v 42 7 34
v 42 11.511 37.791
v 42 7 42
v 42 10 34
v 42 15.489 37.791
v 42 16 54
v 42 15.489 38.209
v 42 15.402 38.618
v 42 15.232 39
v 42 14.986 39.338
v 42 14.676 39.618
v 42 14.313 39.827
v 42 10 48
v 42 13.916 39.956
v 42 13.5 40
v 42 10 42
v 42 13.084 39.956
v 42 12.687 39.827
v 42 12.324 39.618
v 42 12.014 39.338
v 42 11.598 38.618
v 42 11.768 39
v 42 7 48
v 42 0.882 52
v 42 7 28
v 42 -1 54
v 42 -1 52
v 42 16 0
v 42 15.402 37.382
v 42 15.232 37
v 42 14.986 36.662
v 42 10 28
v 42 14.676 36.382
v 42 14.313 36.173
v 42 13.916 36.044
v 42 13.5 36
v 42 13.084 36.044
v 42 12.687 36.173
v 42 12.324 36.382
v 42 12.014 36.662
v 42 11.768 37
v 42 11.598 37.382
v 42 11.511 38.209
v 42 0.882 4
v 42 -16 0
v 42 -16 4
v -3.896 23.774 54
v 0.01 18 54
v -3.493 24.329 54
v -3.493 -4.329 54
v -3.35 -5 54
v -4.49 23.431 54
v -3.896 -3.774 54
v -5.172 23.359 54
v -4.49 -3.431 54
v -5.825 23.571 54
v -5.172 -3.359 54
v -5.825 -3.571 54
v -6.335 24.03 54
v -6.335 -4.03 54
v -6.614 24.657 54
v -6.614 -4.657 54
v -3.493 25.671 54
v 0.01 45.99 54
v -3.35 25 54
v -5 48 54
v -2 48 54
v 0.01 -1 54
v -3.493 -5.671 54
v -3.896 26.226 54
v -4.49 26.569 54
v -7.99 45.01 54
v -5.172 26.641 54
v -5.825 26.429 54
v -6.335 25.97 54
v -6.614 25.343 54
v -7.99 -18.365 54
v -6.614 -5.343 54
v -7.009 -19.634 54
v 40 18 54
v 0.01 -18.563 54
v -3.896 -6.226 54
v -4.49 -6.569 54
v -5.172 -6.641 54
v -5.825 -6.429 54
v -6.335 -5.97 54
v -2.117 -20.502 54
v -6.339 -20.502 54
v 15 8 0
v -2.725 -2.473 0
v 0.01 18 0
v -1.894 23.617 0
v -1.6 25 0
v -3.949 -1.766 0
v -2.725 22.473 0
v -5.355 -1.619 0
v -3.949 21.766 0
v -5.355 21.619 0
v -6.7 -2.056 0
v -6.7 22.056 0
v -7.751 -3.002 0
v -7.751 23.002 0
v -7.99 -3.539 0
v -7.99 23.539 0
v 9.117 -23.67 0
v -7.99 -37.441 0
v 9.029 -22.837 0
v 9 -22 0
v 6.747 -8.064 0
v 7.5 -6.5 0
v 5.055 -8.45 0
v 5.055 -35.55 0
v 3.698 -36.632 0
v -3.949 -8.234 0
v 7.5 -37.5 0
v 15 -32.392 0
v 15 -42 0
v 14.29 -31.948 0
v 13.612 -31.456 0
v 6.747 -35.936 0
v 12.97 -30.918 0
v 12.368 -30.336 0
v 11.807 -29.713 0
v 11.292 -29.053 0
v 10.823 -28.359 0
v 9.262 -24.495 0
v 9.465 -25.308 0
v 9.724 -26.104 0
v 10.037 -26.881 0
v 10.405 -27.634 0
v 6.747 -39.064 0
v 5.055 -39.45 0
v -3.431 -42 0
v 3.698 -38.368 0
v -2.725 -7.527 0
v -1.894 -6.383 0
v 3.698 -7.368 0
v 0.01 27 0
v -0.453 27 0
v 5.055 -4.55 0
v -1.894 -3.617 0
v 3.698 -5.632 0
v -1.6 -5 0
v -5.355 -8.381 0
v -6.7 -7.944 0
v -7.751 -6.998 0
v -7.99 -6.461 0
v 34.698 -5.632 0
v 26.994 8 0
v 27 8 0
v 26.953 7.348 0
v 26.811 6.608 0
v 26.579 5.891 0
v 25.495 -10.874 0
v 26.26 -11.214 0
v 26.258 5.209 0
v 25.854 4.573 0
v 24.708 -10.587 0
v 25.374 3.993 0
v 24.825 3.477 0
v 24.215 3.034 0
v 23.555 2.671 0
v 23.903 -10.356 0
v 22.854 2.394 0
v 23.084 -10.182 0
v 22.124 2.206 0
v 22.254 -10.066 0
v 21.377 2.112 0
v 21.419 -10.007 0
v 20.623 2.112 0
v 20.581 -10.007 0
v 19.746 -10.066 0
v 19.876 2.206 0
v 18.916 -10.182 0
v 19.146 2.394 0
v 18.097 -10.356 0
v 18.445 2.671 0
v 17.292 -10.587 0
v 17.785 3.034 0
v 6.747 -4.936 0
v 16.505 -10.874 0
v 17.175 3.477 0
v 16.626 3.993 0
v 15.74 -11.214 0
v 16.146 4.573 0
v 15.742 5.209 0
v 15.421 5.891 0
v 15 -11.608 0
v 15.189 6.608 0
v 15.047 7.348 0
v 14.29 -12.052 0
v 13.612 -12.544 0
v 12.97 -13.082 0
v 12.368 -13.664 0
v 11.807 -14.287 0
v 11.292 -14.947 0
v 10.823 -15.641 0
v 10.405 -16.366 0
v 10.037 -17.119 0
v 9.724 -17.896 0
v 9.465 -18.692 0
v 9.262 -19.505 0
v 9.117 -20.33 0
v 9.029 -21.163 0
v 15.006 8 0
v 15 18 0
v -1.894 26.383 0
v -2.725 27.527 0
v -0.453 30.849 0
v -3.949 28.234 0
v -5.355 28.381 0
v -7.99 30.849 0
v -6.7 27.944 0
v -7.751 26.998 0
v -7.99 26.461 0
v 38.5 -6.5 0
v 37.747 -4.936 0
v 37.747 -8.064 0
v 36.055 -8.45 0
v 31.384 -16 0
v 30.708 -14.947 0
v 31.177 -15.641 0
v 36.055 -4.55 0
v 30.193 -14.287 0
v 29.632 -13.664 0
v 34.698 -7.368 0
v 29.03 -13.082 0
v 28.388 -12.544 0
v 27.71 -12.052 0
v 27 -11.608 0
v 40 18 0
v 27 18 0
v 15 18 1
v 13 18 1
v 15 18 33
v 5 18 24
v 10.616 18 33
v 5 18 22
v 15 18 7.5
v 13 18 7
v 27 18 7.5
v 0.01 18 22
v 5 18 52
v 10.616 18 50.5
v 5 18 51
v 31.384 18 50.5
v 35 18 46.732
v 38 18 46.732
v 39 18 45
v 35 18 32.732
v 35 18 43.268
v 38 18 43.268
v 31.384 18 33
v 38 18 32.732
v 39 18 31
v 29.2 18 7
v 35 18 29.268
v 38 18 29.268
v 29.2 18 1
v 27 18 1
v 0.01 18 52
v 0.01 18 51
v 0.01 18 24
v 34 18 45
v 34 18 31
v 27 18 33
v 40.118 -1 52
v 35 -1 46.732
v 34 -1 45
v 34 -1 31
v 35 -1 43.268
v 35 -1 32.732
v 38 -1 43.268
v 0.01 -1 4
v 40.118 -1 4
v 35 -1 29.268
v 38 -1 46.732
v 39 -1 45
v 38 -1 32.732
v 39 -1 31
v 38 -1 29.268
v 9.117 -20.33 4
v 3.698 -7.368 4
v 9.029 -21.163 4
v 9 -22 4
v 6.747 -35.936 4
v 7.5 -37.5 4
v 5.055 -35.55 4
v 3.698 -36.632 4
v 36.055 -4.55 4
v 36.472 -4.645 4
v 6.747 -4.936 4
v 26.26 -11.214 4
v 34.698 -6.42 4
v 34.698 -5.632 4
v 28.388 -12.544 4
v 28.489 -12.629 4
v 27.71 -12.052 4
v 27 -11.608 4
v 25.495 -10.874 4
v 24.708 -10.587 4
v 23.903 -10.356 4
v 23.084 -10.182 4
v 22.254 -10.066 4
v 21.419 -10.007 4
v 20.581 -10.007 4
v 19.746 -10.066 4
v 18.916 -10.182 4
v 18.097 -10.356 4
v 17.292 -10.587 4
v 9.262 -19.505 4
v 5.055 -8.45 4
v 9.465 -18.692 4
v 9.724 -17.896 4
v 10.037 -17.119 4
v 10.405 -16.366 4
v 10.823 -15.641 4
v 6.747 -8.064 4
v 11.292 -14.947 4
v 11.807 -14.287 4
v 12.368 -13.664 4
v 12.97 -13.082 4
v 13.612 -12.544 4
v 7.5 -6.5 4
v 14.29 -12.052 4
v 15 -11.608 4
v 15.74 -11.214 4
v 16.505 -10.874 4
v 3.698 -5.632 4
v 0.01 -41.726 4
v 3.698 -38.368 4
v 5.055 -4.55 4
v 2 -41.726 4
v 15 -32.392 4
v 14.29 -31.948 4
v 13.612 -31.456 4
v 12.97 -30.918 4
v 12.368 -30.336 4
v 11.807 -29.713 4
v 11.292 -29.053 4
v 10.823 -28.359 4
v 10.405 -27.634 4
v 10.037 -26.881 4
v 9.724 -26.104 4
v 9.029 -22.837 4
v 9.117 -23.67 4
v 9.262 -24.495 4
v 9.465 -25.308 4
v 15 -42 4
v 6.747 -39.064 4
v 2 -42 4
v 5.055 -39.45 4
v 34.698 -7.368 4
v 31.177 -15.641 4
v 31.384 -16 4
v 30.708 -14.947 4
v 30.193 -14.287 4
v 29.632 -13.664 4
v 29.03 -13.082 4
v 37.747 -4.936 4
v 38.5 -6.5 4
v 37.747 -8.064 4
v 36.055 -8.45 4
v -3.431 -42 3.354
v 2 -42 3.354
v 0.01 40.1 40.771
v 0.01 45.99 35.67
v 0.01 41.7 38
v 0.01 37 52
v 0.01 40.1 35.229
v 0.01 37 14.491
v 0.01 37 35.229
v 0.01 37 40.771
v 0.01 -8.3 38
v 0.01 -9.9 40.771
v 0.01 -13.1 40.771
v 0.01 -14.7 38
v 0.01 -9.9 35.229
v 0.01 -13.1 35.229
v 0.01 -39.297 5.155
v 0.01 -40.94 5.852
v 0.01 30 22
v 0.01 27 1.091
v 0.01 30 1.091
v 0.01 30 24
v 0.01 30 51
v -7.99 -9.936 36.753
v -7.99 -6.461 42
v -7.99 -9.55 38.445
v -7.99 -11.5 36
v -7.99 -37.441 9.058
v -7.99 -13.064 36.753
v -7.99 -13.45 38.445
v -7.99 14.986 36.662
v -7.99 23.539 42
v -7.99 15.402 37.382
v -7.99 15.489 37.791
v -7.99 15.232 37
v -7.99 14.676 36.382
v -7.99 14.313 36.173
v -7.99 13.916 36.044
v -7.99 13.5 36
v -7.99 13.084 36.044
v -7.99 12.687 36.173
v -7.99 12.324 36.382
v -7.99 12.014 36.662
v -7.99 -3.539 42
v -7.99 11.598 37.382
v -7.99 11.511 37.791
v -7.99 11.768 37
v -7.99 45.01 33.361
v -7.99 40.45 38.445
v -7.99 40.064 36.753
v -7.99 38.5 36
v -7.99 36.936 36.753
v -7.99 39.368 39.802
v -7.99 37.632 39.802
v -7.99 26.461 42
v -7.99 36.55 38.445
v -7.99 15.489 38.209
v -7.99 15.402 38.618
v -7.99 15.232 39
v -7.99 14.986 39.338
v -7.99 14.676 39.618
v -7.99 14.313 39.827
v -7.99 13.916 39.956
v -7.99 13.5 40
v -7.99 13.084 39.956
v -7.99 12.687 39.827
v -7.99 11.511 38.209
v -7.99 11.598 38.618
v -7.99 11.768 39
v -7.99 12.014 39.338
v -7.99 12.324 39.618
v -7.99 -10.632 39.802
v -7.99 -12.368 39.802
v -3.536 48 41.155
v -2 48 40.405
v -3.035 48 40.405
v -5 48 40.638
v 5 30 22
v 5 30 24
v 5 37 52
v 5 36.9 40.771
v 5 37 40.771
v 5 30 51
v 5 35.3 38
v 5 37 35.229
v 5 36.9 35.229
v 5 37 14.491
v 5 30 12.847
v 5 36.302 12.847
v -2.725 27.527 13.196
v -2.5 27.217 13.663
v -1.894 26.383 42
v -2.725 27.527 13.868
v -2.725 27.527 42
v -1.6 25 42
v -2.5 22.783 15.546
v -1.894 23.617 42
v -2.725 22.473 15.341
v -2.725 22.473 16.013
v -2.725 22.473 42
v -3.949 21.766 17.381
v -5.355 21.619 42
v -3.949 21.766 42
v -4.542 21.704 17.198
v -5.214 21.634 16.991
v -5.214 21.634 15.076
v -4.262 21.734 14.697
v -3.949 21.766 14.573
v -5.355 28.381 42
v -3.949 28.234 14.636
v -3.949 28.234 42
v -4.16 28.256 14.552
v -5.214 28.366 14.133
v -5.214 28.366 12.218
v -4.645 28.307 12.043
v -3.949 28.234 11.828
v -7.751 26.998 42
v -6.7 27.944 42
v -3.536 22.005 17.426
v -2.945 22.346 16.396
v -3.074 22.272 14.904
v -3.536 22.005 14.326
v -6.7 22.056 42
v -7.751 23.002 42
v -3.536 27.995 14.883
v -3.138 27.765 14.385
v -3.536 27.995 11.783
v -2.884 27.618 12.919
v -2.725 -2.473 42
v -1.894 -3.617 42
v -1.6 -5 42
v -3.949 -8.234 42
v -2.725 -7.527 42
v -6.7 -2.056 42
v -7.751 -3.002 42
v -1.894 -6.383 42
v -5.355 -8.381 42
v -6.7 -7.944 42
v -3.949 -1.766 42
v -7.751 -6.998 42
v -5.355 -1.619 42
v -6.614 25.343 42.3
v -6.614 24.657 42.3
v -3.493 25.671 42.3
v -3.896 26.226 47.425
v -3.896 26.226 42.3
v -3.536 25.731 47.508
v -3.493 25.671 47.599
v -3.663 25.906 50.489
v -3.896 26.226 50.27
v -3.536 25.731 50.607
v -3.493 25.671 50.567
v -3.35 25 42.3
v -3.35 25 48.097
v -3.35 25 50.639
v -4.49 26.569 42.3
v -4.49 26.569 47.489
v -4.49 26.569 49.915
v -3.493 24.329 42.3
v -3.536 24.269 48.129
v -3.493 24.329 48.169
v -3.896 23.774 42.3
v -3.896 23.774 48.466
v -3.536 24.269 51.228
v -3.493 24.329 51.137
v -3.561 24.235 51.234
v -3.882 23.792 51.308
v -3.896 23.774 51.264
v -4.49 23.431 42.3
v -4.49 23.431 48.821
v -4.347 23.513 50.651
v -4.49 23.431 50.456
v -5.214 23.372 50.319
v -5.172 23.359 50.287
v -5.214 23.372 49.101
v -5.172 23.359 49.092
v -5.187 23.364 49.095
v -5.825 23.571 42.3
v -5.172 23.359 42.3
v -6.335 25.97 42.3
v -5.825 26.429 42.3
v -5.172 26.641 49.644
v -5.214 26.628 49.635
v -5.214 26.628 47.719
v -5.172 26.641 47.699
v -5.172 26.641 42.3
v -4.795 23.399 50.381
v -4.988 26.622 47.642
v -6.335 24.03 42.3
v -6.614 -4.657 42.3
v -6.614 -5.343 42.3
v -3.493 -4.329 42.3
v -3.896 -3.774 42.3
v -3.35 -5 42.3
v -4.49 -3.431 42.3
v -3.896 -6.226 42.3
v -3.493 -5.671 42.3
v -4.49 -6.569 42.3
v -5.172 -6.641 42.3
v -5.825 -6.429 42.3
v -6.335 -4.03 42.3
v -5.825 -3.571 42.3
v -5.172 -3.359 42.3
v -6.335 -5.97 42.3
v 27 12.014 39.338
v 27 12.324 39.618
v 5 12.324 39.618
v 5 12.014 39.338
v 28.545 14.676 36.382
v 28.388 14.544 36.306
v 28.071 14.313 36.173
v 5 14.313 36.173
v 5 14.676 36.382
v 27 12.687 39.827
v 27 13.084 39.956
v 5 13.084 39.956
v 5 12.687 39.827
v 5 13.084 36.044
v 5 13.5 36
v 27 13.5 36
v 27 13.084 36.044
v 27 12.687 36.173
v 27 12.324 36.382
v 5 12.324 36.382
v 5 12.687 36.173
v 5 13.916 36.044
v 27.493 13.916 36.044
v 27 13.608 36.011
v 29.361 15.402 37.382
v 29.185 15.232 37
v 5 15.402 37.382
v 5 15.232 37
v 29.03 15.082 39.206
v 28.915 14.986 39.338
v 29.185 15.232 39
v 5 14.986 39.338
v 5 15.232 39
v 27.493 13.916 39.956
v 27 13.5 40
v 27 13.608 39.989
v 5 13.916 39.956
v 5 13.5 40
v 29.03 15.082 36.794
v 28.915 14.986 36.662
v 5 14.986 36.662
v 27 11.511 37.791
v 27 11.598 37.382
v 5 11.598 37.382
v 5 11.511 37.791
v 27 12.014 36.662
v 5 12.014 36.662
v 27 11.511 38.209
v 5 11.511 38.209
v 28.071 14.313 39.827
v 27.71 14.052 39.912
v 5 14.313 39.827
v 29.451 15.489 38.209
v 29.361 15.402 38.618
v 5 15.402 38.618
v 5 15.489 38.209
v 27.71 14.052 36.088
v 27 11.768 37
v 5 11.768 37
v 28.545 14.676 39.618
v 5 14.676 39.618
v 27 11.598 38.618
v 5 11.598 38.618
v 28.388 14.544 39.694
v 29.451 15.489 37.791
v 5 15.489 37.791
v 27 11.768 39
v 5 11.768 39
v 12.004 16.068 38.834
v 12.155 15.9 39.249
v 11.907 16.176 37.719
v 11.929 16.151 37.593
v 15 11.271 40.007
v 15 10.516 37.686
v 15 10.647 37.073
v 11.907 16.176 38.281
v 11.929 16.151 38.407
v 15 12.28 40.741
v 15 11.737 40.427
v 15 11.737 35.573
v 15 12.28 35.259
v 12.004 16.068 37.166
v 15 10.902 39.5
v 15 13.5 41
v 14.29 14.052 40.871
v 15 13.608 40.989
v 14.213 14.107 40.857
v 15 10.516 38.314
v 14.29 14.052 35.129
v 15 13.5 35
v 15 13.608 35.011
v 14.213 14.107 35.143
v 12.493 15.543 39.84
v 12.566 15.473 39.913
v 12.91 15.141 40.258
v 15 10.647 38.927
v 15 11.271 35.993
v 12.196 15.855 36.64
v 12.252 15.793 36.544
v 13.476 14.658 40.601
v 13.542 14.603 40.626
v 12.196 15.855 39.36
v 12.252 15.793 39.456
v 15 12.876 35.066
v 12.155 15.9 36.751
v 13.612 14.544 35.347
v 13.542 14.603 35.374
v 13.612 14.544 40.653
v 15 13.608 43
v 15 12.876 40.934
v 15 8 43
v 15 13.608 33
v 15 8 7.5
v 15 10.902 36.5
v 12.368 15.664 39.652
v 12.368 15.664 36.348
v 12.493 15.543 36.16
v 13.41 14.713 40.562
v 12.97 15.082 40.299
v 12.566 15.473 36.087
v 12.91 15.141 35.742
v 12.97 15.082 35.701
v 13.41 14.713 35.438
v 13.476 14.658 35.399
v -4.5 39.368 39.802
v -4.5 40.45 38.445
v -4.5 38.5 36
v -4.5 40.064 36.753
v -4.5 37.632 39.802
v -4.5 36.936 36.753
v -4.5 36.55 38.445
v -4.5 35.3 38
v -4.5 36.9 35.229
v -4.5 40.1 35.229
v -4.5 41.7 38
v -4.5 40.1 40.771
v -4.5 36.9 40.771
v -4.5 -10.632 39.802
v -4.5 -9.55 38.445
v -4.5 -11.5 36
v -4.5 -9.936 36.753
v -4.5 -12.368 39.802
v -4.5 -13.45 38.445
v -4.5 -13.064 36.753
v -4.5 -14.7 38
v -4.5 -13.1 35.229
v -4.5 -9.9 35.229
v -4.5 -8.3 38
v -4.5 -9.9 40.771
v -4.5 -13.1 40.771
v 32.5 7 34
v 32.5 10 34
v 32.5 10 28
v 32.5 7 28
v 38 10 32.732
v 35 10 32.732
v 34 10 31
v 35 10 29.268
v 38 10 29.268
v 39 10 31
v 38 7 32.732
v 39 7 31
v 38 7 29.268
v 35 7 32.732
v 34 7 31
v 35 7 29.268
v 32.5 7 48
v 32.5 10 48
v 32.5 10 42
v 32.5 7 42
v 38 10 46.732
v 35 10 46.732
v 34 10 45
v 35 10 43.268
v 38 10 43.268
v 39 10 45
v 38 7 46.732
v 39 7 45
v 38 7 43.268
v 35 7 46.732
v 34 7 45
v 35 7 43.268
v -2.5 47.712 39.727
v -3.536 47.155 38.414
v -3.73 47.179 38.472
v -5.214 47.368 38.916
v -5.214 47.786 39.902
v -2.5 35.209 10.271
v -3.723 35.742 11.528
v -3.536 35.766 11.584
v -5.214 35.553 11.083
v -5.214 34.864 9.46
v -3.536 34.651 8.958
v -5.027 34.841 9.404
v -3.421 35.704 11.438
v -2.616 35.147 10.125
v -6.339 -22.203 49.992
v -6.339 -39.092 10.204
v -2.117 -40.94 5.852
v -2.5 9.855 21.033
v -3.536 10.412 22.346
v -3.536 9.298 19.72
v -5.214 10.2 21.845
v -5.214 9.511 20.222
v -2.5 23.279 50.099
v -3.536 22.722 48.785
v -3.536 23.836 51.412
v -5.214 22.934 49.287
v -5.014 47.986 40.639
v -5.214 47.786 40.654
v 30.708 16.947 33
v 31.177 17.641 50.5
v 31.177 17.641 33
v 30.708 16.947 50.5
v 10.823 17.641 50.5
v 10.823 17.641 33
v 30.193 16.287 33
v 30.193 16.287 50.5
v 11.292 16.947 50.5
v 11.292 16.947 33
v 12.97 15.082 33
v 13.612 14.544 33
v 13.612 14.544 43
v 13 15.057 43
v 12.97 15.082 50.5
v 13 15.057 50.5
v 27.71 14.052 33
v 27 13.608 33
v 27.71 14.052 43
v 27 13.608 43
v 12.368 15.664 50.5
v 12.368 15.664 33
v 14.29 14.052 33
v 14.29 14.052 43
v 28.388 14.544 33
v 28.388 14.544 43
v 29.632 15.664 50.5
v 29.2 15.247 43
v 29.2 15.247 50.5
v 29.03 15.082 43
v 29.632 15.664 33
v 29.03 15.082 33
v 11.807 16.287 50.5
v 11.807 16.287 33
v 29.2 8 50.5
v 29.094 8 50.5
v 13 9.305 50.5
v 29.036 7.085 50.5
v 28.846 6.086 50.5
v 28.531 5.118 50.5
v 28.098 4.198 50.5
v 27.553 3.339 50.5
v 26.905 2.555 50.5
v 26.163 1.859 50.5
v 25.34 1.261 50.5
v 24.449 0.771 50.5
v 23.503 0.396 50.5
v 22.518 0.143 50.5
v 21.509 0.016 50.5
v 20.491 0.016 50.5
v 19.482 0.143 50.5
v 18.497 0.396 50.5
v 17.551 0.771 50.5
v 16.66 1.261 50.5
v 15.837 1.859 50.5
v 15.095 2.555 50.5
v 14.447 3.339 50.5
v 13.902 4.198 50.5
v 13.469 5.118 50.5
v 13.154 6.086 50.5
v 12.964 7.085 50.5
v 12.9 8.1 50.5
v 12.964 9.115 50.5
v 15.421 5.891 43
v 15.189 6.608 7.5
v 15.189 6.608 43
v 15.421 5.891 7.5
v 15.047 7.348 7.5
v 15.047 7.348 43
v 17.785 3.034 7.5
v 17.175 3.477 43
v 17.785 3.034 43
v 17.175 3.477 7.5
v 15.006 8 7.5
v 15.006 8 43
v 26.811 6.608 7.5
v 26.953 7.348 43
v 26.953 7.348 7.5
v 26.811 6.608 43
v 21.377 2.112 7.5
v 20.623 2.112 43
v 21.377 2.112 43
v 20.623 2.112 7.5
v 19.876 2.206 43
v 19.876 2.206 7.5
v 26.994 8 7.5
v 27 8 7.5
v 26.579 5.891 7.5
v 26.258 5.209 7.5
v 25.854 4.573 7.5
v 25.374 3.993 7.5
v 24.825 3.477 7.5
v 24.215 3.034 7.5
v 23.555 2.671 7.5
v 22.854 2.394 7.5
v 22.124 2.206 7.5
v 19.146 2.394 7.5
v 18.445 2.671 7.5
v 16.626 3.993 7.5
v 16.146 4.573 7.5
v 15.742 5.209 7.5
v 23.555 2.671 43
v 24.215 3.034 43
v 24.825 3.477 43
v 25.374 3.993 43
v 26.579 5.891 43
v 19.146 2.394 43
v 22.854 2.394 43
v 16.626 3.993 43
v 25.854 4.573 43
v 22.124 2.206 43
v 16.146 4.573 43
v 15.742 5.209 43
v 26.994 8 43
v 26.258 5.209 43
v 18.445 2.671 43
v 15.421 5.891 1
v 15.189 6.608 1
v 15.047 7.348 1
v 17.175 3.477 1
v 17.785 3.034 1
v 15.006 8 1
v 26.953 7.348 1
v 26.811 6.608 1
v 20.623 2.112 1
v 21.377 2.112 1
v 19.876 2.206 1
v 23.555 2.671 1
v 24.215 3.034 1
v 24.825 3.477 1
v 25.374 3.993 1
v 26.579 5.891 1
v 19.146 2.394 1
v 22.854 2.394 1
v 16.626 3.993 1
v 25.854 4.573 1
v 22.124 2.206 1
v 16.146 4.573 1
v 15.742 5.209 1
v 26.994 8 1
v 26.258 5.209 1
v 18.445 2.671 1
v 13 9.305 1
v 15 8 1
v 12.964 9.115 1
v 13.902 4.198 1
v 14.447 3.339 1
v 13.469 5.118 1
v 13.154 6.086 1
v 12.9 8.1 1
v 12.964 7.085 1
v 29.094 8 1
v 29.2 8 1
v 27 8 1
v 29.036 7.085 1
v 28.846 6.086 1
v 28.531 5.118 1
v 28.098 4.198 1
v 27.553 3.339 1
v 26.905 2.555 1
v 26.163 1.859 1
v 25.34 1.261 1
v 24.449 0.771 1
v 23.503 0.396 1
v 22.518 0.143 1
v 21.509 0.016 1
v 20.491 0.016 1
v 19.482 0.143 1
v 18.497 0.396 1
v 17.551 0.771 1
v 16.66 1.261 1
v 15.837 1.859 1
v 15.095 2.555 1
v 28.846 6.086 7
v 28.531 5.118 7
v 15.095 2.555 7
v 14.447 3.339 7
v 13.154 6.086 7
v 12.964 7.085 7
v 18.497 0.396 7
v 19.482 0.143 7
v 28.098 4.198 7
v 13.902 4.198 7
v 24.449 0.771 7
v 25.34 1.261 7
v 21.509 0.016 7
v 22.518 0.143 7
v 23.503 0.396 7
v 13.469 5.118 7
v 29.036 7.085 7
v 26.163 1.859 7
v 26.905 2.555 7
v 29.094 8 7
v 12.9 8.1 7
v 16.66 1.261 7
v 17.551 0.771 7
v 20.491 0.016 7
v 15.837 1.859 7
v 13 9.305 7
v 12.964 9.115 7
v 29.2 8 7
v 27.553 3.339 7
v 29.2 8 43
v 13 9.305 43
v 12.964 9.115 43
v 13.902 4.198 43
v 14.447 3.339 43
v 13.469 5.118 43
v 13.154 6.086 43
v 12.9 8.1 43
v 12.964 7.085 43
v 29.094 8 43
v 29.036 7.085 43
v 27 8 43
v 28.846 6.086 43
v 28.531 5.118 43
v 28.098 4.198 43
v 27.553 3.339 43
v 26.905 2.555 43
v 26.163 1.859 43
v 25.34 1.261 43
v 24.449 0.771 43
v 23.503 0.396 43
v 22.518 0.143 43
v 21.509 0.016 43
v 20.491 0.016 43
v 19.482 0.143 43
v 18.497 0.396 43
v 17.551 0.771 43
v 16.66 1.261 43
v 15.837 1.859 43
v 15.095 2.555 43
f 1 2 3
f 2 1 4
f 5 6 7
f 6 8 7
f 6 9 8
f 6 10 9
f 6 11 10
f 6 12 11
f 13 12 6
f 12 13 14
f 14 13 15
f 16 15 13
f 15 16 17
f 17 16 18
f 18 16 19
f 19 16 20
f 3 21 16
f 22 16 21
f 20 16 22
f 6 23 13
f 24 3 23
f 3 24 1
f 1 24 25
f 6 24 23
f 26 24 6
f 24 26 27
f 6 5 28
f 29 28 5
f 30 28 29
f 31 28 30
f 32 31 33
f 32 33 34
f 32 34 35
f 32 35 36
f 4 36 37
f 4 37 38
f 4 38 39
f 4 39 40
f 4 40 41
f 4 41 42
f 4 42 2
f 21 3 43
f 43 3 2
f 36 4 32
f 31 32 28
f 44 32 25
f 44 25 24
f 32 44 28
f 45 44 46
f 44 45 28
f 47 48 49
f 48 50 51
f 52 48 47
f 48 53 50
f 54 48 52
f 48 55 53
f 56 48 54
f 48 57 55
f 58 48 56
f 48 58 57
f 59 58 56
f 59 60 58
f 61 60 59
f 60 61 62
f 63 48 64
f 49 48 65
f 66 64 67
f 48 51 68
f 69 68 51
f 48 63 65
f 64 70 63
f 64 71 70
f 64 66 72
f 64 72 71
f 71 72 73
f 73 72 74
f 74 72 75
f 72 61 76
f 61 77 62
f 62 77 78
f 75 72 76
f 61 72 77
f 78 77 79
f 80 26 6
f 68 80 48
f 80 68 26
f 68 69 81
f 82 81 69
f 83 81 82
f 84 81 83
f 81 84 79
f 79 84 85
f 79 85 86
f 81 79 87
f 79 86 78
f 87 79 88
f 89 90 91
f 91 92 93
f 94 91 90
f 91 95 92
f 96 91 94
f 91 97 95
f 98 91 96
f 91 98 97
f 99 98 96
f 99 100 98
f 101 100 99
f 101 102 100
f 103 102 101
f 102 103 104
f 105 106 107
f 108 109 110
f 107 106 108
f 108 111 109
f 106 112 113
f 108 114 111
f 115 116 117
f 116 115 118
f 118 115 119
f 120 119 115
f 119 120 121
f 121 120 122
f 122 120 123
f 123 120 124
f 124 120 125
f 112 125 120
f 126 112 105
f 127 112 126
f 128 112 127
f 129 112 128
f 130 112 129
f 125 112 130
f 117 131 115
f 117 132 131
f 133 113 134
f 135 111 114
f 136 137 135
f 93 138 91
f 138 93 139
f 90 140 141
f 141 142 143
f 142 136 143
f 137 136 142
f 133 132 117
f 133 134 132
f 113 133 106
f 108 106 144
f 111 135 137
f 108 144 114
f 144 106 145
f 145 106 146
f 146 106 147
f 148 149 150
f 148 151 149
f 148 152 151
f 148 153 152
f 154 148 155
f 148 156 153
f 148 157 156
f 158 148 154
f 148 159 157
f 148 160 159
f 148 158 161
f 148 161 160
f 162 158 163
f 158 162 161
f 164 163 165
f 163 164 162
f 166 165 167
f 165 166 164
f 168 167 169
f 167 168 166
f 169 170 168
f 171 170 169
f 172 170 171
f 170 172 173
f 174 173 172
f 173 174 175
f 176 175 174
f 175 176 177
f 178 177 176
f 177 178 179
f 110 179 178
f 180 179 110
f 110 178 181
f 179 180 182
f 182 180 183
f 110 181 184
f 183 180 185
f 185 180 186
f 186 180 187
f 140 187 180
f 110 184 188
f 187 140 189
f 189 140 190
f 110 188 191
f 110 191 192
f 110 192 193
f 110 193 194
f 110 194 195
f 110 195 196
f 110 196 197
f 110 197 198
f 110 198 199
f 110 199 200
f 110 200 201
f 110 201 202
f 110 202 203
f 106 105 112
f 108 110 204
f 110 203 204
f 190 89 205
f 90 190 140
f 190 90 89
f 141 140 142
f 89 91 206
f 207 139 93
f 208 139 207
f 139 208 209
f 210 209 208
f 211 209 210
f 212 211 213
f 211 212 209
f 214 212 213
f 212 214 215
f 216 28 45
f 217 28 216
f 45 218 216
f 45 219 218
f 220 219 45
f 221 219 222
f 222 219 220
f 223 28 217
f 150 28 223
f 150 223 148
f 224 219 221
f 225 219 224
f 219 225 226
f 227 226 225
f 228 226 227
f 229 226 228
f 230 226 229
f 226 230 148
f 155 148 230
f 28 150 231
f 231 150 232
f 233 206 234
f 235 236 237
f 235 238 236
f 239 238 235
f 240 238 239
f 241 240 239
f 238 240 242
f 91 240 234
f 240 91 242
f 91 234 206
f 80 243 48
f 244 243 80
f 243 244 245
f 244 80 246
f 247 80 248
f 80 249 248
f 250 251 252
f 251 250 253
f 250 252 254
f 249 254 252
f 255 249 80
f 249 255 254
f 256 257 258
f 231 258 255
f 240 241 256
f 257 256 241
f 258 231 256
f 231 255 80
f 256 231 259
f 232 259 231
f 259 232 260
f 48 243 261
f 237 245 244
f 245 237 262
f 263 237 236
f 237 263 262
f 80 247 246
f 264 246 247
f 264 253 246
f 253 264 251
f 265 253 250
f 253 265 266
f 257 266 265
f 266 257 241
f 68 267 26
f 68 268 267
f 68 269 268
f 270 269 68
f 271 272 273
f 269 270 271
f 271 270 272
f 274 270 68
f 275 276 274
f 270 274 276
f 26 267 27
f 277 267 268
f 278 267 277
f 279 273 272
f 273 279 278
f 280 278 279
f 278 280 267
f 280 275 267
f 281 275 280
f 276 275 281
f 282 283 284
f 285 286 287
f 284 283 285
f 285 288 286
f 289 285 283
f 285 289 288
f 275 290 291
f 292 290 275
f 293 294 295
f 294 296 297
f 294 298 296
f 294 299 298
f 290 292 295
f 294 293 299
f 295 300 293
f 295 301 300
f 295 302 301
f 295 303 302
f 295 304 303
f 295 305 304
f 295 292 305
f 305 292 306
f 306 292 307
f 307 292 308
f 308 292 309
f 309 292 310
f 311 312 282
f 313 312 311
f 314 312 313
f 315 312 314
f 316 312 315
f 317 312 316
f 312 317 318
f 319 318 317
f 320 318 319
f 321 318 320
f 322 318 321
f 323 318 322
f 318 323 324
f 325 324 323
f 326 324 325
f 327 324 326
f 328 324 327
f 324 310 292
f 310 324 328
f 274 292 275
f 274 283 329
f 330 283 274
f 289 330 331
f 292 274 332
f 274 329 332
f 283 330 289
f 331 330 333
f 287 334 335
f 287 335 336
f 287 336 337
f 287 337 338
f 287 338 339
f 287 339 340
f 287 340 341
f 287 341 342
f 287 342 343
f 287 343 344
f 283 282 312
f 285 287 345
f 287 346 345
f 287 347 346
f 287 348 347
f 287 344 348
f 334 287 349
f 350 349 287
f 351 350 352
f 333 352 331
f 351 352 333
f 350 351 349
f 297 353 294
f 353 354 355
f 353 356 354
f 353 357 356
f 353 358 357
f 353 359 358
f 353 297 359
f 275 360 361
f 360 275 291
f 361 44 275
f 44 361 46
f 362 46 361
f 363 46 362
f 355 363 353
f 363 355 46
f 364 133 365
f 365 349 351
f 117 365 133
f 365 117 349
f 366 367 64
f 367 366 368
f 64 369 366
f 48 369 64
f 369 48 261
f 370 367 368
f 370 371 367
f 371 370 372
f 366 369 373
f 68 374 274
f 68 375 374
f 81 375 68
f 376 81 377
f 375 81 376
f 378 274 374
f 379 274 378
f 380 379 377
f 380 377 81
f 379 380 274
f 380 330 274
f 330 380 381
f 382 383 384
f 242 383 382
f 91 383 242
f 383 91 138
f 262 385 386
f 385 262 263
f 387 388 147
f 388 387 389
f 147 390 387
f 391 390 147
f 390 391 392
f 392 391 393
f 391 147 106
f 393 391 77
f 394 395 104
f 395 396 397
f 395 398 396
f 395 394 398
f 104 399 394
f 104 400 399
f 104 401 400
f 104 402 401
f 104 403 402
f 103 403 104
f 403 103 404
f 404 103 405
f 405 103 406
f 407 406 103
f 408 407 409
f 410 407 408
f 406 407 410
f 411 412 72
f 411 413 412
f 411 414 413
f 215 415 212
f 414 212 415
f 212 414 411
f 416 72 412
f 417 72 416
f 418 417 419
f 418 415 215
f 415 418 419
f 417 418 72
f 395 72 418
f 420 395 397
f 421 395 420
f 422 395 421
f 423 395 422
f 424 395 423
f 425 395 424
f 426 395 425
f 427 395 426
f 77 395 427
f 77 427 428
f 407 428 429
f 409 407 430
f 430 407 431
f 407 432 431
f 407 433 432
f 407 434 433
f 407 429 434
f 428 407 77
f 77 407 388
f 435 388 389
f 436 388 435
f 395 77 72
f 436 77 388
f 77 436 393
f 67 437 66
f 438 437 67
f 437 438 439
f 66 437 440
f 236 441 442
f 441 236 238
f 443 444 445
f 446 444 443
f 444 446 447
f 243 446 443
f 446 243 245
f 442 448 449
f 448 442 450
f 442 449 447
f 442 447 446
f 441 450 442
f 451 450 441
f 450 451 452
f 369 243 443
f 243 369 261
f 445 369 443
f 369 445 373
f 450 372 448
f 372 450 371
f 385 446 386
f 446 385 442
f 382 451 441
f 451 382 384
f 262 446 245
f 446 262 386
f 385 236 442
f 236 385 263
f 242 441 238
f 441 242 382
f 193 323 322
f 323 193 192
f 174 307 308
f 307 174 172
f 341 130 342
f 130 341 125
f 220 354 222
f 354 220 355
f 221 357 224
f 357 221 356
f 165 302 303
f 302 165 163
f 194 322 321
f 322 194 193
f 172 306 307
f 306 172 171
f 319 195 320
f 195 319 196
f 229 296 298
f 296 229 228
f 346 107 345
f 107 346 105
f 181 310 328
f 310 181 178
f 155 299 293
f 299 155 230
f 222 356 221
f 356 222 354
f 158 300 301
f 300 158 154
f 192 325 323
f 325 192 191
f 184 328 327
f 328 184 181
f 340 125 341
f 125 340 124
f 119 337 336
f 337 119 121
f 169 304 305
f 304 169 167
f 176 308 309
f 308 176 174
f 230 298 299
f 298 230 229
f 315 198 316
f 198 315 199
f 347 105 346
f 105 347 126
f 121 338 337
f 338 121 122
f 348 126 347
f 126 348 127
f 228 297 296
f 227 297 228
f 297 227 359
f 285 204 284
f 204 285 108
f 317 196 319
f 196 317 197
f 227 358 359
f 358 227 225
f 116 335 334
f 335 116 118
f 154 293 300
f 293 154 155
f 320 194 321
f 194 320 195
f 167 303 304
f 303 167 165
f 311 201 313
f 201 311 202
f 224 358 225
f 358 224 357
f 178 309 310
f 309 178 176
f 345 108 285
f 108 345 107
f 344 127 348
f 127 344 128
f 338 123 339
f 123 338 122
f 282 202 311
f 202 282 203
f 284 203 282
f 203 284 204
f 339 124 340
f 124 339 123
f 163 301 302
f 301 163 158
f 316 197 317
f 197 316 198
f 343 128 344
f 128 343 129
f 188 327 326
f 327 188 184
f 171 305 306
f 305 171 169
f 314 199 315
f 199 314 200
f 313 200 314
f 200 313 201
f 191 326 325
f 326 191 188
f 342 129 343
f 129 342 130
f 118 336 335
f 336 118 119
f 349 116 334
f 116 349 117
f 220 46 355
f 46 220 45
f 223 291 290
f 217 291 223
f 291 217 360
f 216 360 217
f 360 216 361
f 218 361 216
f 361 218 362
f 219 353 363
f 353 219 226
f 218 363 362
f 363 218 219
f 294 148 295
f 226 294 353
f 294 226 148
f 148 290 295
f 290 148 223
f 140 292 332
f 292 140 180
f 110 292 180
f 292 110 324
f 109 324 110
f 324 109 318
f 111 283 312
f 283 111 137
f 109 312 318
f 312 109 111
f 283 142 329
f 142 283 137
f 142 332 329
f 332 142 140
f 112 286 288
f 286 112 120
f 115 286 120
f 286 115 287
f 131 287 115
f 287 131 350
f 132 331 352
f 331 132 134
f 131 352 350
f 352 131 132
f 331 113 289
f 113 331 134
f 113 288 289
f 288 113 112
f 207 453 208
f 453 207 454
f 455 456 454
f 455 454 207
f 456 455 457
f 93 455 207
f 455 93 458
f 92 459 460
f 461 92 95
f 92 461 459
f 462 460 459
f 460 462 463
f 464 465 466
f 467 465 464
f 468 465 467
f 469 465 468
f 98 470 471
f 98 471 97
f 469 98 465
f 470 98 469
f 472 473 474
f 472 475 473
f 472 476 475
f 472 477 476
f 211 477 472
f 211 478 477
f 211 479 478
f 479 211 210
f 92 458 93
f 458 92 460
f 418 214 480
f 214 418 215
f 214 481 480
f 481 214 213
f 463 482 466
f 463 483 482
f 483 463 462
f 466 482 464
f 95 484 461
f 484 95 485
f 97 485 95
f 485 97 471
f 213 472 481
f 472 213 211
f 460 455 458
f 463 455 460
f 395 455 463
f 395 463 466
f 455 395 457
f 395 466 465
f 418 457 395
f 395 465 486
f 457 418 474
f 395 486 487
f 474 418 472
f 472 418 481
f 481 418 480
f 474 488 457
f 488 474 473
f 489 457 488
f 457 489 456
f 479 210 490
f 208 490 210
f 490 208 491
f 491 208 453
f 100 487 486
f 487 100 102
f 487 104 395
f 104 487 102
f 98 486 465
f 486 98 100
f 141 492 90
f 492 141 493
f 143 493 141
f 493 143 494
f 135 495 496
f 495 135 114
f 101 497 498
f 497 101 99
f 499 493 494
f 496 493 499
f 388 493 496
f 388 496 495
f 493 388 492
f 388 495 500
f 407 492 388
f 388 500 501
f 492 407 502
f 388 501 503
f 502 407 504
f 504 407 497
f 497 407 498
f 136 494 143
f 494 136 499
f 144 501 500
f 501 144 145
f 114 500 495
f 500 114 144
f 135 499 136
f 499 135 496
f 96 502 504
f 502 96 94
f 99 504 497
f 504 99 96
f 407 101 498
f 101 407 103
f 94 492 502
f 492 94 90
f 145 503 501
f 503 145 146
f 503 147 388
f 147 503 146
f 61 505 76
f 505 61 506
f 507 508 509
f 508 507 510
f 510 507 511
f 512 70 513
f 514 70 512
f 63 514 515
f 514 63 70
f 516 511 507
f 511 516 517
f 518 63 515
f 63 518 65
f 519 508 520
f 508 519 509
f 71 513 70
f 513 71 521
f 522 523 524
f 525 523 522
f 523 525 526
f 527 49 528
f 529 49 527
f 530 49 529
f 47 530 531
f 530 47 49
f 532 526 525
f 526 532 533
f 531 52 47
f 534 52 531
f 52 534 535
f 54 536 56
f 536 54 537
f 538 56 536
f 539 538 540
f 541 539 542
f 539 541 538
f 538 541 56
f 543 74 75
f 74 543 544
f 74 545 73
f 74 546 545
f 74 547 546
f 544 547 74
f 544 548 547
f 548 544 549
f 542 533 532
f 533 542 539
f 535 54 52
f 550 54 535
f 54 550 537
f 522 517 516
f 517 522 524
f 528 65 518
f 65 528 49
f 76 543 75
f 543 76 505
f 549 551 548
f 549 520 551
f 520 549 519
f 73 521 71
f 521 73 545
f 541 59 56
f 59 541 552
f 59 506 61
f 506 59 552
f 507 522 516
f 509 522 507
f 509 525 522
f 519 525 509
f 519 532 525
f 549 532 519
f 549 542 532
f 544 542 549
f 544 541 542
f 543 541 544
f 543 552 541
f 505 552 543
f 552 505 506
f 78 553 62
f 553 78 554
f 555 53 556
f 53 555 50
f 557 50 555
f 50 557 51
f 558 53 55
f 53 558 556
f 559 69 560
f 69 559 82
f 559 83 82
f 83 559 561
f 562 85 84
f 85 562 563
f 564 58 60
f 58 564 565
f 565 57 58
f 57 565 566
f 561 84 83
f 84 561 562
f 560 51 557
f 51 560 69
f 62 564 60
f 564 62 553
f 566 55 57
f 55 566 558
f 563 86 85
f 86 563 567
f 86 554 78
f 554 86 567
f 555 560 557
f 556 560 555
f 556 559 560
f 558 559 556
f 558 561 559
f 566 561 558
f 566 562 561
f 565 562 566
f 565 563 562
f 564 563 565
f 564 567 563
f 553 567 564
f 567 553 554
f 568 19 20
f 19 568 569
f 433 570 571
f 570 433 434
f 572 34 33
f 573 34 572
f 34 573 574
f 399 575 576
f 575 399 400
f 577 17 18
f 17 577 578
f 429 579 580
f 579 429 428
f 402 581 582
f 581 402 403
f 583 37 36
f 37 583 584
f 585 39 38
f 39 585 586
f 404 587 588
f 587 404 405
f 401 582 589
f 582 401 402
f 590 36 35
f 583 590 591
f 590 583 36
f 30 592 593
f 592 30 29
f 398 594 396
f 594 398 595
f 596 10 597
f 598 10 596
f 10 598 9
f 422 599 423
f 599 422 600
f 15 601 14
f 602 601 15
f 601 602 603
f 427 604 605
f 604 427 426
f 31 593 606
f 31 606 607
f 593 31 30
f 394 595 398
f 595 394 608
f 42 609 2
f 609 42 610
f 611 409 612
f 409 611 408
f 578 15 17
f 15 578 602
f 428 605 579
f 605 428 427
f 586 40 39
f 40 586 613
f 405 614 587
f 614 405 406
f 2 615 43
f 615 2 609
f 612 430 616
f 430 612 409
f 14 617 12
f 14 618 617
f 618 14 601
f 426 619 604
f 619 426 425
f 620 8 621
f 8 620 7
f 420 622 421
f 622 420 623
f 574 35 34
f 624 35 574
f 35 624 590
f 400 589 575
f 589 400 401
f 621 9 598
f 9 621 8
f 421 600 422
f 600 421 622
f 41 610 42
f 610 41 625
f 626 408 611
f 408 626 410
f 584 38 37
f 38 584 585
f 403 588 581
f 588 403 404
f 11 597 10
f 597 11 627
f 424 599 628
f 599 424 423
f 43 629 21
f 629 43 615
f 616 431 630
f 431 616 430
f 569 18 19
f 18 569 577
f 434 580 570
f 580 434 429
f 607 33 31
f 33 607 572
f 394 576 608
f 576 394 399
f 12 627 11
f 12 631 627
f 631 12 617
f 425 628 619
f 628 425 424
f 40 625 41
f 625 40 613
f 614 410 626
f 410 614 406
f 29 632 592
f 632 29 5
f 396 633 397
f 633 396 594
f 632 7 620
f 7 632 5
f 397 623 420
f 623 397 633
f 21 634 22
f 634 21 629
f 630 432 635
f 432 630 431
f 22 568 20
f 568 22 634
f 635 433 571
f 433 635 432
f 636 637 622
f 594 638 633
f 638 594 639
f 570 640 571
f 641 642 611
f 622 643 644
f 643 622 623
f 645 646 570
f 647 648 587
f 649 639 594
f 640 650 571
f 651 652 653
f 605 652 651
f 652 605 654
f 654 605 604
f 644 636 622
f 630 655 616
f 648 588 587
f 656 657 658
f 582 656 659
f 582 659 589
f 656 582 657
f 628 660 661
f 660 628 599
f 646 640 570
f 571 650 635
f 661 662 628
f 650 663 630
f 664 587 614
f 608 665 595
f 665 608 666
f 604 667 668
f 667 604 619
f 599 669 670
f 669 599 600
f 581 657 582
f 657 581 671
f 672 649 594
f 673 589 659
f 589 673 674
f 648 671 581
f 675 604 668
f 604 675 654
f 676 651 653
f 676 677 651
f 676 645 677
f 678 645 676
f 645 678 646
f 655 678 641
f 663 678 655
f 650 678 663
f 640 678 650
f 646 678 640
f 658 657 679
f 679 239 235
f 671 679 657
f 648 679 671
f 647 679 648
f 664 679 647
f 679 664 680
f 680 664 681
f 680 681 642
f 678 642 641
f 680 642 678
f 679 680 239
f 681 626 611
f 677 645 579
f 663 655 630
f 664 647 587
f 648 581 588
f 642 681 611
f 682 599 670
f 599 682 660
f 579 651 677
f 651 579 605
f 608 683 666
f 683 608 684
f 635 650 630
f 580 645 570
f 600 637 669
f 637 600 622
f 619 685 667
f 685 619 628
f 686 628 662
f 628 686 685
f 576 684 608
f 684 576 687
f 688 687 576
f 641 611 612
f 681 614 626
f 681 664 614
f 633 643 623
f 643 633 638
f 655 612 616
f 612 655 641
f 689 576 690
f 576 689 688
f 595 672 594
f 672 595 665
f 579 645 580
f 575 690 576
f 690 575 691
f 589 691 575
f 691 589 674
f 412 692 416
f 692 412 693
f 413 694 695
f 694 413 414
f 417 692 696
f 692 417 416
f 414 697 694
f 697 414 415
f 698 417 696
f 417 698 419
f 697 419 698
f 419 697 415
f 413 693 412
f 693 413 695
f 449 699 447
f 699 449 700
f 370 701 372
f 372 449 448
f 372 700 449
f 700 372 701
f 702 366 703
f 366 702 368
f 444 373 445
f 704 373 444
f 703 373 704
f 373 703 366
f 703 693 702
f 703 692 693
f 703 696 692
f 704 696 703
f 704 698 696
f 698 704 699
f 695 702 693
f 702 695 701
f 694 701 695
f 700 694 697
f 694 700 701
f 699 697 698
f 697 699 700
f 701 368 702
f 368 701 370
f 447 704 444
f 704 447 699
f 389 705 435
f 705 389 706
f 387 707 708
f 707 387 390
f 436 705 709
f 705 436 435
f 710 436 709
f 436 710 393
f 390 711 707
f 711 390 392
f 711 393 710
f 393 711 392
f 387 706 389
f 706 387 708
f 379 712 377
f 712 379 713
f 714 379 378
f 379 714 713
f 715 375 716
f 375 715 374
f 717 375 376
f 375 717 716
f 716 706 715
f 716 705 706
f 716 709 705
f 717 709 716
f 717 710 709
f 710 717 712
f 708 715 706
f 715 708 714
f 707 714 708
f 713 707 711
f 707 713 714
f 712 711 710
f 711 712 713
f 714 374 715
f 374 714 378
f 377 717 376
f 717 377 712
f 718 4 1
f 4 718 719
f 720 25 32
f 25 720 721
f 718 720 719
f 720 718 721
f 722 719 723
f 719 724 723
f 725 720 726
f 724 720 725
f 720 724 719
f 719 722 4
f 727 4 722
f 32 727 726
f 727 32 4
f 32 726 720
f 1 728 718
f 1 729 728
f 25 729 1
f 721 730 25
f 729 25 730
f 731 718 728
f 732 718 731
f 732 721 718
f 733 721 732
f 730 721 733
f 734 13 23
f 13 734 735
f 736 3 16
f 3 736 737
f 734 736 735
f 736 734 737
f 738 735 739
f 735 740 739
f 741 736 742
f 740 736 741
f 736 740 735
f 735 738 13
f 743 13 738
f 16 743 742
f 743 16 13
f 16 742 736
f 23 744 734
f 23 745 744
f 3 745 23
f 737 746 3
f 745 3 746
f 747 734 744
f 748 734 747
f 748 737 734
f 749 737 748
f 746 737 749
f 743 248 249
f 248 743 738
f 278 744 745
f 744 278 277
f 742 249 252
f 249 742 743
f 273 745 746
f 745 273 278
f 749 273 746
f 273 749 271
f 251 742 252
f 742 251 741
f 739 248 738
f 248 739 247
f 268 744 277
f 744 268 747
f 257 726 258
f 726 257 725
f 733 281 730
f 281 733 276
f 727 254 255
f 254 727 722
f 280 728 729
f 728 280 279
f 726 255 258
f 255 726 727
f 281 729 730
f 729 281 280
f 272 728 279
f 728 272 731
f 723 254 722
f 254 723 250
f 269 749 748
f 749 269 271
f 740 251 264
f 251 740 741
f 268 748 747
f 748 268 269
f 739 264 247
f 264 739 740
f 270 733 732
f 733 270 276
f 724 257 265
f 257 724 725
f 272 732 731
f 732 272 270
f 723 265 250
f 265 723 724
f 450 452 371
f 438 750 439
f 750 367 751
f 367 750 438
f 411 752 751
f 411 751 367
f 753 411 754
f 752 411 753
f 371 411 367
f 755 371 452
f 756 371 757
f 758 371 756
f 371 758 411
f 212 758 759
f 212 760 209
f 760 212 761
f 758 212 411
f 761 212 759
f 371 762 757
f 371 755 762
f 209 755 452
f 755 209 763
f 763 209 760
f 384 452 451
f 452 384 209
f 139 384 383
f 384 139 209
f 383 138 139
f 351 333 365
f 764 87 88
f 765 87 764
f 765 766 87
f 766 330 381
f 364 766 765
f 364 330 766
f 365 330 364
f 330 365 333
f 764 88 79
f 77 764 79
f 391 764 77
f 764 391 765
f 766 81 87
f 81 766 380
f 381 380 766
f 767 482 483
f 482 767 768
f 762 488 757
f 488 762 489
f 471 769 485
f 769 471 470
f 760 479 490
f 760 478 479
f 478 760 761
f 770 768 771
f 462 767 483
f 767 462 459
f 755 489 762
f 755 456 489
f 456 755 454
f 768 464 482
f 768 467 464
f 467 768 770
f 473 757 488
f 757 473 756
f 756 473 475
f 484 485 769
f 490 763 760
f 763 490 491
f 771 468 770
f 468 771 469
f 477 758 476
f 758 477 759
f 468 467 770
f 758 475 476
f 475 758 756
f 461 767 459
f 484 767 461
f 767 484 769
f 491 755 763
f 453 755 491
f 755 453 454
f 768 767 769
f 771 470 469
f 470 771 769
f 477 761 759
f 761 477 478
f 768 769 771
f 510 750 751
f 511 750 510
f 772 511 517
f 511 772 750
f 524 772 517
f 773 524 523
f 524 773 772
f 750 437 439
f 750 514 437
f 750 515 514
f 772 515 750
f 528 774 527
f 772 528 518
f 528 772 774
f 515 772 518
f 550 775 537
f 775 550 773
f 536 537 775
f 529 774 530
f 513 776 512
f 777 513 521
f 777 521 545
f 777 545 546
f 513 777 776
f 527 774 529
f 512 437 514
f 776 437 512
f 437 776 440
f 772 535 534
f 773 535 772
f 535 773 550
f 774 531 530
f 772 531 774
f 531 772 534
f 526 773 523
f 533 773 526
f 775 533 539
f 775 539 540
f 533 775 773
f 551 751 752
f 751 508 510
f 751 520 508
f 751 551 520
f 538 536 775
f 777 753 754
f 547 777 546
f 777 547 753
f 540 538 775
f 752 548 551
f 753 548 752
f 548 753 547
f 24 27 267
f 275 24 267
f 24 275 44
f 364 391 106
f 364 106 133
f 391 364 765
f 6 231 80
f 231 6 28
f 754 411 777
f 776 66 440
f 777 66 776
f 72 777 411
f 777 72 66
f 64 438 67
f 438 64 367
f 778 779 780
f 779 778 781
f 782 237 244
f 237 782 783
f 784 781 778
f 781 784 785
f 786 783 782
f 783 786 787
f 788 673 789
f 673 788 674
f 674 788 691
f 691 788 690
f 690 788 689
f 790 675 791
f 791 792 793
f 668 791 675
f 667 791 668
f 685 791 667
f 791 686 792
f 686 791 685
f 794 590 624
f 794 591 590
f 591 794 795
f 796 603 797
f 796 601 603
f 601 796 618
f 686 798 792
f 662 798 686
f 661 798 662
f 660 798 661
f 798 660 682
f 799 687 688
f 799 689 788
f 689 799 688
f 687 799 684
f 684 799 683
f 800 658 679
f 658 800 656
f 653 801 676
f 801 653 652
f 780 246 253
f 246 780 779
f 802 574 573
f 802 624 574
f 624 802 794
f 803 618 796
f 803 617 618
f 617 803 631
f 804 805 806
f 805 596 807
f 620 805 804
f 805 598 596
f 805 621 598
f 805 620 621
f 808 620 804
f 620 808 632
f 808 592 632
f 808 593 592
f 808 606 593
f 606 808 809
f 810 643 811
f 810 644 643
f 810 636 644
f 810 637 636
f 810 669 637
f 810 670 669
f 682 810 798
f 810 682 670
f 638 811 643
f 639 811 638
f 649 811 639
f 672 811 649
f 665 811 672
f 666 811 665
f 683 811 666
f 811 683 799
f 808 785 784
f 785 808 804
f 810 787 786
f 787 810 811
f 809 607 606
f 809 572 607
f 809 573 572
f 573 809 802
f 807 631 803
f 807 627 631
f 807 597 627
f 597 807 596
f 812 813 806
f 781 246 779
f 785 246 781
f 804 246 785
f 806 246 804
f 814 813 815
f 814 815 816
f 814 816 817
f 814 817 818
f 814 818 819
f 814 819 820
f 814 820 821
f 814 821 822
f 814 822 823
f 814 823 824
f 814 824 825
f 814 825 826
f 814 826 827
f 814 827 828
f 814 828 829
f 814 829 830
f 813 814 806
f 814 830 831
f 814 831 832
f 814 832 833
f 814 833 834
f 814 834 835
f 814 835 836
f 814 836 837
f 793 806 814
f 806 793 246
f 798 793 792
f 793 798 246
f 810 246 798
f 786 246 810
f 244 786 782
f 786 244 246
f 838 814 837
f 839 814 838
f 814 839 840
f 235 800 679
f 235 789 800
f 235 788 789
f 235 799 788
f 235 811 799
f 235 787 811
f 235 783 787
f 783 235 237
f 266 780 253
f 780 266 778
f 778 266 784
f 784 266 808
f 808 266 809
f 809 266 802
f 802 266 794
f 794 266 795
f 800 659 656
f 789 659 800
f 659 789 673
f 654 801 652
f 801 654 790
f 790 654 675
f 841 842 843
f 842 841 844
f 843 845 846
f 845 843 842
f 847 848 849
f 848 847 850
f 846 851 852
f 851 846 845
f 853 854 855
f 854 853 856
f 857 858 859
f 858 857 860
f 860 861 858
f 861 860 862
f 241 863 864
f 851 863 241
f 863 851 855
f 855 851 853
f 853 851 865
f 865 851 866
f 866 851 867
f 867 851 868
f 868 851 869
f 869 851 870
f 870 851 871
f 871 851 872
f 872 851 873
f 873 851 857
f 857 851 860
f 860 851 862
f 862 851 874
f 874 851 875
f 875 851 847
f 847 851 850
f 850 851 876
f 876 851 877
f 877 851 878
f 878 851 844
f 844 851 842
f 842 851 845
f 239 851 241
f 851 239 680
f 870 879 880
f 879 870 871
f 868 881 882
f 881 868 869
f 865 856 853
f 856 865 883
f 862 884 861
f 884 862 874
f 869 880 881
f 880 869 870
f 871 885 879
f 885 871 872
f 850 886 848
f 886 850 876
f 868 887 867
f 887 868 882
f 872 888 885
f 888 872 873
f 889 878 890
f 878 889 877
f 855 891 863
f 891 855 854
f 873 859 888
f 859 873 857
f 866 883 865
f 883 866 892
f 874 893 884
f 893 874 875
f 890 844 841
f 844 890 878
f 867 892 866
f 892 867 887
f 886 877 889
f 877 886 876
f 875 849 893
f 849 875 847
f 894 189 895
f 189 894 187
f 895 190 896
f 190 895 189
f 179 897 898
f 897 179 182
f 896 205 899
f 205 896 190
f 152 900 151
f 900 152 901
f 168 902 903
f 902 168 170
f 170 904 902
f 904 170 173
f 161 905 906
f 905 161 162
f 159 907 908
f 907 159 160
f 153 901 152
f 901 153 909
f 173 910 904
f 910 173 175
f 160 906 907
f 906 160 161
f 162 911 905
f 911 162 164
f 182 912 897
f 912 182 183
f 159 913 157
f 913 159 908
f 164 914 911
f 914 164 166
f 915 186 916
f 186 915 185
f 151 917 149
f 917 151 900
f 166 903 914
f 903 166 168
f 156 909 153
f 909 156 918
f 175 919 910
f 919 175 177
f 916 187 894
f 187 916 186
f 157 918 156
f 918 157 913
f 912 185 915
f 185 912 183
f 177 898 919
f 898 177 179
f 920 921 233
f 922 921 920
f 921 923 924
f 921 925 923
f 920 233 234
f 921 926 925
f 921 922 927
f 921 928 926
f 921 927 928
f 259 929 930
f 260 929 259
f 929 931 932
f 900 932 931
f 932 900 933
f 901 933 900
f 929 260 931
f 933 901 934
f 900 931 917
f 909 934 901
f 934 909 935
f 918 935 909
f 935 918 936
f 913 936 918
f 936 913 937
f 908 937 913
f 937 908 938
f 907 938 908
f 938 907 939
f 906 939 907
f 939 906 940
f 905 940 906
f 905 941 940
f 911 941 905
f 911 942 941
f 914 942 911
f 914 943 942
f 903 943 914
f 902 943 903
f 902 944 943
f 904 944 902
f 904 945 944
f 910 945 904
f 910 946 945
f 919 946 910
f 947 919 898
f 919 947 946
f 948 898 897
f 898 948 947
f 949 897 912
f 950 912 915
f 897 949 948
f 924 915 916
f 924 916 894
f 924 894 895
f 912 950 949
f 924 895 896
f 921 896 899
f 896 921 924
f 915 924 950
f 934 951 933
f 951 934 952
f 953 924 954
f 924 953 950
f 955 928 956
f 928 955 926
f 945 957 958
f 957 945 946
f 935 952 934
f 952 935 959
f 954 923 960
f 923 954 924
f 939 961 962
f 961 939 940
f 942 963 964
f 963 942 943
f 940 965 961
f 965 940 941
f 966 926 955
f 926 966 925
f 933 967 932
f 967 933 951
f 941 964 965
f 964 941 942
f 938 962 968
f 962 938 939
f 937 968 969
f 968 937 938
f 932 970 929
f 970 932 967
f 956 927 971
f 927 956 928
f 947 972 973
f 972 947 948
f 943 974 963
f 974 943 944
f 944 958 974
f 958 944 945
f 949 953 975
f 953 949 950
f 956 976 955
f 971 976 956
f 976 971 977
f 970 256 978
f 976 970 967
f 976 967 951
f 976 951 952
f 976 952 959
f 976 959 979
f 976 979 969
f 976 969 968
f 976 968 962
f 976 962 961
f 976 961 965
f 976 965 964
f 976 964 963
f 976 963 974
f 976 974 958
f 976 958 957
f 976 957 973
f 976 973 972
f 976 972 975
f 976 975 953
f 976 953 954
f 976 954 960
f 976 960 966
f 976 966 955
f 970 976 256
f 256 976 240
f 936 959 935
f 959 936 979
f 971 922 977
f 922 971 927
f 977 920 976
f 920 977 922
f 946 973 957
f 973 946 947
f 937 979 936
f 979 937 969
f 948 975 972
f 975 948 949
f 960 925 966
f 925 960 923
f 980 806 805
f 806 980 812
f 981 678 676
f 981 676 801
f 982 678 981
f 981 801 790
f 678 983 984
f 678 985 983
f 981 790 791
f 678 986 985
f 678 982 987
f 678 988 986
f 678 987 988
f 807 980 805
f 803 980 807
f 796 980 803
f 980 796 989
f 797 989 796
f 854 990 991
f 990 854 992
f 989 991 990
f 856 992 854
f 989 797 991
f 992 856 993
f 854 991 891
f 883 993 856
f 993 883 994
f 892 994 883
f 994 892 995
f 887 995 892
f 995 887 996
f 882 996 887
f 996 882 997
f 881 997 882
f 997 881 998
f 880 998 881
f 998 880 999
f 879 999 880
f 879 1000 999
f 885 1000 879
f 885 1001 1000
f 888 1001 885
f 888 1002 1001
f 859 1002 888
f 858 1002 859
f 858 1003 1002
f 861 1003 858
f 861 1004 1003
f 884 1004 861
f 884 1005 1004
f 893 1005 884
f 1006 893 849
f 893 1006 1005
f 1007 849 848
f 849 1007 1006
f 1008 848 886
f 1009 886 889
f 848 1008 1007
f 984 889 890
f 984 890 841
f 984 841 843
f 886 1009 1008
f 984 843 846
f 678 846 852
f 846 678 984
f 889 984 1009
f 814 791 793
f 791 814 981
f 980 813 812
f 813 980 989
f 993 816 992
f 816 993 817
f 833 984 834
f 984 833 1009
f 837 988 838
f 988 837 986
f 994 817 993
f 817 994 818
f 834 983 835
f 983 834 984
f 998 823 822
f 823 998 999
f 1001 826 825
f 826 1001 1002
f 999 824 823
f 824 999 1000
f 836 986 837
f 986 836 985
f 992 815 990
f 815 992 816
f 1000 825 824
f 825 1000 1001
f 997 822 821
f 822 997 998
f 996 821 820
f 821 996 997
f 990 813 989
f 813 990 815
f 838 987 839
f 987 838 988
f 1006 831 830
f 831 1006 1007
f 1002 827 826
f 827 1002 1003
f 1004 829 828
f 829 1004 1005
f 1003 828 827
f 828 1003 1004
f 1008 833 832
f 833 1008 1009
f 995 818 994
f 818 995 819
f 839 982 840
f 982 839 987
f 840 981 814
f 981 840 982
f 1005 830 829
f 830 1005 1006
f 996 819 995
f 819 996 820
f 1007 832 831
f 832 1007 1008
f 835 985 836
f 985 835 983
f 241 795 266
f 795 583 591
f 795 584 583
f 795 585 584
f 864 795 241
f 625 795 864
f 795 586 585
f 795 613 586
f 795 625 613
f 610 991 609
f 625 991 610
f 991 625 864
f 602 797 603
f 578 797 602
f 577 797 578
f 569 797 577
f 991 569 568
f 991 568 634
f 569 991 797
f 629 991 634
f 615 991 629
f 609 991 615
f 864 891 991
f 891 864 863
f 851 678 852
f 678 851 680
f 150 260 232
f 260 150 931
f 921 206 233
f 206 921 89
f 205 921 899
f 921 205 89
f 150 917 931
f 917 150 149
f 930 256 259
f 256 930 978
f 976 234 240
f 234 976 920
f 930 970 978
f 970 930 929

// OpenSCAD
// PRUSA iteration3
// NEMA 17 extruder body
// GNU GPL v3
// Josef Průša <iam@josefprusa.cz>, Kliment Yanev and contributors
// http://www.reprap.org/wiki/Prusa_Mendel
// http://prusamendel.org

// offset de los taladros de sujeción
m=5;
// distancia entre taladros de sujeción
support=30;

module nozzlemount(){
rotate([0,90,0]) cylinder(r=2, h=70, $fn=30);
translate([17,0,0]) rotate([0,90,0]) cylinder(r2=3,r1=2, h=10, $fn=30);
translate([1,0,0]) rotate([0,90,0]) cylinder(r1=4, r2=2, h=3);

translate([0,15+10,0]) rotate([0,90,0]) cylinder(r=2, h=70);
translate([10-2.5,15+10,0]) rotate([0,90,0]) rotate([0,0,30]) cylinder(r=3.2, h=70,$fn=6);
translate([0,-25,0]) rotate([0,90,0]) cylinder(r=2, h=70);
translate([10-2.5,-25,0]) rotate([0,90,0]) rotate([0,0,30])cylinder(r=3.2, h=70,$fn=6);
}


difference(){
union(){
translate([0,-1,0]) cube([42,19,54]);
translate([0,-42,0]) cube([42,42+3,4]);
translate([-7.99,-42,0]) cube([8,80+10,54]);

translate([-1,30,0]) cube([6, 7, 52]);


translate([-1,15,51]) cube([6, 20, 1]);
translate([-1,15,22]) cube([6, 20, 2]);

}

//antiwarpagenation

translate([46,-91+28,4])rotate([0,0,45]) cube(48);
translate([-11,-91,-1])rotate([0,0,45])  cube([40,40,60]);
translate([46,12,-1])rotate([0,0,45])  cube([40,40,60]);
translate([-32,12+9,-1])rotate([0,0,45]) cube([40,40,60]);
translate([6,31+9,-1])rotate([0,0,45]) cube([40,40,60]);



// motor circle cut
translate([0,-1,0.5]){
translate([21,-21,-1]) cylinder(r=12, h=5, $fn=90);

 translate([15,-45,-1]) cube([30,30,5]);

translate([21+15.5,-21+15.5,-1]) cylinder(r=2, h=5);
translate([21+15.5,-21-15.5,-1]) cylinder(r=2, h=5);
translate([21-15.5,-21+15.5,-1]) cylinder(r=2, h=5);
translate([21-15.5,-21-15.5,-1]) cylinder(r=2, h=5);
}



// idler bearing cutout

translate([21,24,33]) cylinder(r=12, h=17.5, $fn=90);



translate([21,8.1,7.5]) cylinder(r=6, h=43, $fn=50);

translate([21,8.1,-1]) cylinder(r=6, h=3, $fn=50);
// Second filament drive bearing
translate([21,8.1,1]) cylinder(r=8.1, h=6, $fn=50);
// Second filament drive bearing insert cutout

translate([13,8,43]) cube([16.2,20,7.5]);


translate([21,8.1,-5+52-4]) cylinder(r=8.1, h=7.5, $fn=50);
translate([-6+21,8,7.5]) cube([12,12,40]);

translate([-6+21,8,-50+7]) cube([12,12,50]);


translate([13,8,1]) cube([16.2,20,6]);

//mounting to carriage
translate([-5,20,-28]){
translate([0,0+m ,0])rotate([0,0,0])cylinder(r=3.4, h=70, $fn=15);
translate([0,0-support+m ,0])rotate([0,0,0])cylinder(r=3.4, h=70, $fn=15);
// make a layer for the holes
translate([0,0+m ,70+0.3]) rotate([0,0,0]) cylinder(r=3.3/2, h=12, $fn=15);
translate([0,0-support+m  ,70.3])rotate([0,0,0])cylinder(r=3.3/2, h=12, $fn=15);
}

// idler nuts and filament channels

translate([0,0,-2]){
translate([-12,2+8+3.5,52-12]) nozzlemount();
//translate([-10,2+8+4,52-12-25]) nozzlemount();

translate([32.5,7,52-12-7-3]) cube([15,3,6]);

translate([32.5,7,52-12-7-3+14]) cube([15,3,6]);


//translate([5+32,-1,52-12+7]) rotate([0,90,90]) rotate([0,0,30]) cylinder(r=3.3, h=10, $fn=6);
//translate([5+32,-1,52-12-7]) rotate([0,90,90]) rotate([0,0,30]) cylinder(r=3.3, h=10, $fn=6);



translate([5+32,-1,52-12+7]) rotate([0,90,90]) rotate([0,0,30]) cylinder(r=2, h=40, $fn=6);
translate([5+32,-1,52-12-7]) rotate([0,90,90]) rotate([0,0,30]) cylinder(r=2, h=40, $fn=6);
translate([5+31,-1,52-12+7]) rotate([0,90,90]) rotate([0,0,30]) cylinder(r=2, h=40, $fn=6);
translate([5+31,-1,52-12-7]) rotate([0,90,90]) rotate([0,0,30]) cylinder(r=2, h=40, $fn=6);


// pretty cutout
translate([-10,27+3,0]) rotate([-23,0,0]) cube([20,12+20,50+10]);
translate([-3,27,6-10]) rotate([0,23,0]) cube([20,12,50]);

// pretty cutout
translate([-10,-66,0]) rotate([-23,0,0])  cube([12,20,90]);
// new pretty
translate([-10+3,-66+4,14-10]) rotate([-23,0,0]) rotate([0,0,40]) cube([12,20,90]);
translate([10,-66+20,10]) rotate([-23,0,0]) rotate([0,0,40+90]) cube([12,20,90]);

//fan holes
translate([-4,28+10,10]) rotate([90-23,0,0])  translate([0,1,0]) cylinder(r=3/2,h=31);
translate([-4,28+10,10]) rotate([90-23,0,0])  translate([0,1+32,0]) cylinder(r=3/2,h=30);


}
}
